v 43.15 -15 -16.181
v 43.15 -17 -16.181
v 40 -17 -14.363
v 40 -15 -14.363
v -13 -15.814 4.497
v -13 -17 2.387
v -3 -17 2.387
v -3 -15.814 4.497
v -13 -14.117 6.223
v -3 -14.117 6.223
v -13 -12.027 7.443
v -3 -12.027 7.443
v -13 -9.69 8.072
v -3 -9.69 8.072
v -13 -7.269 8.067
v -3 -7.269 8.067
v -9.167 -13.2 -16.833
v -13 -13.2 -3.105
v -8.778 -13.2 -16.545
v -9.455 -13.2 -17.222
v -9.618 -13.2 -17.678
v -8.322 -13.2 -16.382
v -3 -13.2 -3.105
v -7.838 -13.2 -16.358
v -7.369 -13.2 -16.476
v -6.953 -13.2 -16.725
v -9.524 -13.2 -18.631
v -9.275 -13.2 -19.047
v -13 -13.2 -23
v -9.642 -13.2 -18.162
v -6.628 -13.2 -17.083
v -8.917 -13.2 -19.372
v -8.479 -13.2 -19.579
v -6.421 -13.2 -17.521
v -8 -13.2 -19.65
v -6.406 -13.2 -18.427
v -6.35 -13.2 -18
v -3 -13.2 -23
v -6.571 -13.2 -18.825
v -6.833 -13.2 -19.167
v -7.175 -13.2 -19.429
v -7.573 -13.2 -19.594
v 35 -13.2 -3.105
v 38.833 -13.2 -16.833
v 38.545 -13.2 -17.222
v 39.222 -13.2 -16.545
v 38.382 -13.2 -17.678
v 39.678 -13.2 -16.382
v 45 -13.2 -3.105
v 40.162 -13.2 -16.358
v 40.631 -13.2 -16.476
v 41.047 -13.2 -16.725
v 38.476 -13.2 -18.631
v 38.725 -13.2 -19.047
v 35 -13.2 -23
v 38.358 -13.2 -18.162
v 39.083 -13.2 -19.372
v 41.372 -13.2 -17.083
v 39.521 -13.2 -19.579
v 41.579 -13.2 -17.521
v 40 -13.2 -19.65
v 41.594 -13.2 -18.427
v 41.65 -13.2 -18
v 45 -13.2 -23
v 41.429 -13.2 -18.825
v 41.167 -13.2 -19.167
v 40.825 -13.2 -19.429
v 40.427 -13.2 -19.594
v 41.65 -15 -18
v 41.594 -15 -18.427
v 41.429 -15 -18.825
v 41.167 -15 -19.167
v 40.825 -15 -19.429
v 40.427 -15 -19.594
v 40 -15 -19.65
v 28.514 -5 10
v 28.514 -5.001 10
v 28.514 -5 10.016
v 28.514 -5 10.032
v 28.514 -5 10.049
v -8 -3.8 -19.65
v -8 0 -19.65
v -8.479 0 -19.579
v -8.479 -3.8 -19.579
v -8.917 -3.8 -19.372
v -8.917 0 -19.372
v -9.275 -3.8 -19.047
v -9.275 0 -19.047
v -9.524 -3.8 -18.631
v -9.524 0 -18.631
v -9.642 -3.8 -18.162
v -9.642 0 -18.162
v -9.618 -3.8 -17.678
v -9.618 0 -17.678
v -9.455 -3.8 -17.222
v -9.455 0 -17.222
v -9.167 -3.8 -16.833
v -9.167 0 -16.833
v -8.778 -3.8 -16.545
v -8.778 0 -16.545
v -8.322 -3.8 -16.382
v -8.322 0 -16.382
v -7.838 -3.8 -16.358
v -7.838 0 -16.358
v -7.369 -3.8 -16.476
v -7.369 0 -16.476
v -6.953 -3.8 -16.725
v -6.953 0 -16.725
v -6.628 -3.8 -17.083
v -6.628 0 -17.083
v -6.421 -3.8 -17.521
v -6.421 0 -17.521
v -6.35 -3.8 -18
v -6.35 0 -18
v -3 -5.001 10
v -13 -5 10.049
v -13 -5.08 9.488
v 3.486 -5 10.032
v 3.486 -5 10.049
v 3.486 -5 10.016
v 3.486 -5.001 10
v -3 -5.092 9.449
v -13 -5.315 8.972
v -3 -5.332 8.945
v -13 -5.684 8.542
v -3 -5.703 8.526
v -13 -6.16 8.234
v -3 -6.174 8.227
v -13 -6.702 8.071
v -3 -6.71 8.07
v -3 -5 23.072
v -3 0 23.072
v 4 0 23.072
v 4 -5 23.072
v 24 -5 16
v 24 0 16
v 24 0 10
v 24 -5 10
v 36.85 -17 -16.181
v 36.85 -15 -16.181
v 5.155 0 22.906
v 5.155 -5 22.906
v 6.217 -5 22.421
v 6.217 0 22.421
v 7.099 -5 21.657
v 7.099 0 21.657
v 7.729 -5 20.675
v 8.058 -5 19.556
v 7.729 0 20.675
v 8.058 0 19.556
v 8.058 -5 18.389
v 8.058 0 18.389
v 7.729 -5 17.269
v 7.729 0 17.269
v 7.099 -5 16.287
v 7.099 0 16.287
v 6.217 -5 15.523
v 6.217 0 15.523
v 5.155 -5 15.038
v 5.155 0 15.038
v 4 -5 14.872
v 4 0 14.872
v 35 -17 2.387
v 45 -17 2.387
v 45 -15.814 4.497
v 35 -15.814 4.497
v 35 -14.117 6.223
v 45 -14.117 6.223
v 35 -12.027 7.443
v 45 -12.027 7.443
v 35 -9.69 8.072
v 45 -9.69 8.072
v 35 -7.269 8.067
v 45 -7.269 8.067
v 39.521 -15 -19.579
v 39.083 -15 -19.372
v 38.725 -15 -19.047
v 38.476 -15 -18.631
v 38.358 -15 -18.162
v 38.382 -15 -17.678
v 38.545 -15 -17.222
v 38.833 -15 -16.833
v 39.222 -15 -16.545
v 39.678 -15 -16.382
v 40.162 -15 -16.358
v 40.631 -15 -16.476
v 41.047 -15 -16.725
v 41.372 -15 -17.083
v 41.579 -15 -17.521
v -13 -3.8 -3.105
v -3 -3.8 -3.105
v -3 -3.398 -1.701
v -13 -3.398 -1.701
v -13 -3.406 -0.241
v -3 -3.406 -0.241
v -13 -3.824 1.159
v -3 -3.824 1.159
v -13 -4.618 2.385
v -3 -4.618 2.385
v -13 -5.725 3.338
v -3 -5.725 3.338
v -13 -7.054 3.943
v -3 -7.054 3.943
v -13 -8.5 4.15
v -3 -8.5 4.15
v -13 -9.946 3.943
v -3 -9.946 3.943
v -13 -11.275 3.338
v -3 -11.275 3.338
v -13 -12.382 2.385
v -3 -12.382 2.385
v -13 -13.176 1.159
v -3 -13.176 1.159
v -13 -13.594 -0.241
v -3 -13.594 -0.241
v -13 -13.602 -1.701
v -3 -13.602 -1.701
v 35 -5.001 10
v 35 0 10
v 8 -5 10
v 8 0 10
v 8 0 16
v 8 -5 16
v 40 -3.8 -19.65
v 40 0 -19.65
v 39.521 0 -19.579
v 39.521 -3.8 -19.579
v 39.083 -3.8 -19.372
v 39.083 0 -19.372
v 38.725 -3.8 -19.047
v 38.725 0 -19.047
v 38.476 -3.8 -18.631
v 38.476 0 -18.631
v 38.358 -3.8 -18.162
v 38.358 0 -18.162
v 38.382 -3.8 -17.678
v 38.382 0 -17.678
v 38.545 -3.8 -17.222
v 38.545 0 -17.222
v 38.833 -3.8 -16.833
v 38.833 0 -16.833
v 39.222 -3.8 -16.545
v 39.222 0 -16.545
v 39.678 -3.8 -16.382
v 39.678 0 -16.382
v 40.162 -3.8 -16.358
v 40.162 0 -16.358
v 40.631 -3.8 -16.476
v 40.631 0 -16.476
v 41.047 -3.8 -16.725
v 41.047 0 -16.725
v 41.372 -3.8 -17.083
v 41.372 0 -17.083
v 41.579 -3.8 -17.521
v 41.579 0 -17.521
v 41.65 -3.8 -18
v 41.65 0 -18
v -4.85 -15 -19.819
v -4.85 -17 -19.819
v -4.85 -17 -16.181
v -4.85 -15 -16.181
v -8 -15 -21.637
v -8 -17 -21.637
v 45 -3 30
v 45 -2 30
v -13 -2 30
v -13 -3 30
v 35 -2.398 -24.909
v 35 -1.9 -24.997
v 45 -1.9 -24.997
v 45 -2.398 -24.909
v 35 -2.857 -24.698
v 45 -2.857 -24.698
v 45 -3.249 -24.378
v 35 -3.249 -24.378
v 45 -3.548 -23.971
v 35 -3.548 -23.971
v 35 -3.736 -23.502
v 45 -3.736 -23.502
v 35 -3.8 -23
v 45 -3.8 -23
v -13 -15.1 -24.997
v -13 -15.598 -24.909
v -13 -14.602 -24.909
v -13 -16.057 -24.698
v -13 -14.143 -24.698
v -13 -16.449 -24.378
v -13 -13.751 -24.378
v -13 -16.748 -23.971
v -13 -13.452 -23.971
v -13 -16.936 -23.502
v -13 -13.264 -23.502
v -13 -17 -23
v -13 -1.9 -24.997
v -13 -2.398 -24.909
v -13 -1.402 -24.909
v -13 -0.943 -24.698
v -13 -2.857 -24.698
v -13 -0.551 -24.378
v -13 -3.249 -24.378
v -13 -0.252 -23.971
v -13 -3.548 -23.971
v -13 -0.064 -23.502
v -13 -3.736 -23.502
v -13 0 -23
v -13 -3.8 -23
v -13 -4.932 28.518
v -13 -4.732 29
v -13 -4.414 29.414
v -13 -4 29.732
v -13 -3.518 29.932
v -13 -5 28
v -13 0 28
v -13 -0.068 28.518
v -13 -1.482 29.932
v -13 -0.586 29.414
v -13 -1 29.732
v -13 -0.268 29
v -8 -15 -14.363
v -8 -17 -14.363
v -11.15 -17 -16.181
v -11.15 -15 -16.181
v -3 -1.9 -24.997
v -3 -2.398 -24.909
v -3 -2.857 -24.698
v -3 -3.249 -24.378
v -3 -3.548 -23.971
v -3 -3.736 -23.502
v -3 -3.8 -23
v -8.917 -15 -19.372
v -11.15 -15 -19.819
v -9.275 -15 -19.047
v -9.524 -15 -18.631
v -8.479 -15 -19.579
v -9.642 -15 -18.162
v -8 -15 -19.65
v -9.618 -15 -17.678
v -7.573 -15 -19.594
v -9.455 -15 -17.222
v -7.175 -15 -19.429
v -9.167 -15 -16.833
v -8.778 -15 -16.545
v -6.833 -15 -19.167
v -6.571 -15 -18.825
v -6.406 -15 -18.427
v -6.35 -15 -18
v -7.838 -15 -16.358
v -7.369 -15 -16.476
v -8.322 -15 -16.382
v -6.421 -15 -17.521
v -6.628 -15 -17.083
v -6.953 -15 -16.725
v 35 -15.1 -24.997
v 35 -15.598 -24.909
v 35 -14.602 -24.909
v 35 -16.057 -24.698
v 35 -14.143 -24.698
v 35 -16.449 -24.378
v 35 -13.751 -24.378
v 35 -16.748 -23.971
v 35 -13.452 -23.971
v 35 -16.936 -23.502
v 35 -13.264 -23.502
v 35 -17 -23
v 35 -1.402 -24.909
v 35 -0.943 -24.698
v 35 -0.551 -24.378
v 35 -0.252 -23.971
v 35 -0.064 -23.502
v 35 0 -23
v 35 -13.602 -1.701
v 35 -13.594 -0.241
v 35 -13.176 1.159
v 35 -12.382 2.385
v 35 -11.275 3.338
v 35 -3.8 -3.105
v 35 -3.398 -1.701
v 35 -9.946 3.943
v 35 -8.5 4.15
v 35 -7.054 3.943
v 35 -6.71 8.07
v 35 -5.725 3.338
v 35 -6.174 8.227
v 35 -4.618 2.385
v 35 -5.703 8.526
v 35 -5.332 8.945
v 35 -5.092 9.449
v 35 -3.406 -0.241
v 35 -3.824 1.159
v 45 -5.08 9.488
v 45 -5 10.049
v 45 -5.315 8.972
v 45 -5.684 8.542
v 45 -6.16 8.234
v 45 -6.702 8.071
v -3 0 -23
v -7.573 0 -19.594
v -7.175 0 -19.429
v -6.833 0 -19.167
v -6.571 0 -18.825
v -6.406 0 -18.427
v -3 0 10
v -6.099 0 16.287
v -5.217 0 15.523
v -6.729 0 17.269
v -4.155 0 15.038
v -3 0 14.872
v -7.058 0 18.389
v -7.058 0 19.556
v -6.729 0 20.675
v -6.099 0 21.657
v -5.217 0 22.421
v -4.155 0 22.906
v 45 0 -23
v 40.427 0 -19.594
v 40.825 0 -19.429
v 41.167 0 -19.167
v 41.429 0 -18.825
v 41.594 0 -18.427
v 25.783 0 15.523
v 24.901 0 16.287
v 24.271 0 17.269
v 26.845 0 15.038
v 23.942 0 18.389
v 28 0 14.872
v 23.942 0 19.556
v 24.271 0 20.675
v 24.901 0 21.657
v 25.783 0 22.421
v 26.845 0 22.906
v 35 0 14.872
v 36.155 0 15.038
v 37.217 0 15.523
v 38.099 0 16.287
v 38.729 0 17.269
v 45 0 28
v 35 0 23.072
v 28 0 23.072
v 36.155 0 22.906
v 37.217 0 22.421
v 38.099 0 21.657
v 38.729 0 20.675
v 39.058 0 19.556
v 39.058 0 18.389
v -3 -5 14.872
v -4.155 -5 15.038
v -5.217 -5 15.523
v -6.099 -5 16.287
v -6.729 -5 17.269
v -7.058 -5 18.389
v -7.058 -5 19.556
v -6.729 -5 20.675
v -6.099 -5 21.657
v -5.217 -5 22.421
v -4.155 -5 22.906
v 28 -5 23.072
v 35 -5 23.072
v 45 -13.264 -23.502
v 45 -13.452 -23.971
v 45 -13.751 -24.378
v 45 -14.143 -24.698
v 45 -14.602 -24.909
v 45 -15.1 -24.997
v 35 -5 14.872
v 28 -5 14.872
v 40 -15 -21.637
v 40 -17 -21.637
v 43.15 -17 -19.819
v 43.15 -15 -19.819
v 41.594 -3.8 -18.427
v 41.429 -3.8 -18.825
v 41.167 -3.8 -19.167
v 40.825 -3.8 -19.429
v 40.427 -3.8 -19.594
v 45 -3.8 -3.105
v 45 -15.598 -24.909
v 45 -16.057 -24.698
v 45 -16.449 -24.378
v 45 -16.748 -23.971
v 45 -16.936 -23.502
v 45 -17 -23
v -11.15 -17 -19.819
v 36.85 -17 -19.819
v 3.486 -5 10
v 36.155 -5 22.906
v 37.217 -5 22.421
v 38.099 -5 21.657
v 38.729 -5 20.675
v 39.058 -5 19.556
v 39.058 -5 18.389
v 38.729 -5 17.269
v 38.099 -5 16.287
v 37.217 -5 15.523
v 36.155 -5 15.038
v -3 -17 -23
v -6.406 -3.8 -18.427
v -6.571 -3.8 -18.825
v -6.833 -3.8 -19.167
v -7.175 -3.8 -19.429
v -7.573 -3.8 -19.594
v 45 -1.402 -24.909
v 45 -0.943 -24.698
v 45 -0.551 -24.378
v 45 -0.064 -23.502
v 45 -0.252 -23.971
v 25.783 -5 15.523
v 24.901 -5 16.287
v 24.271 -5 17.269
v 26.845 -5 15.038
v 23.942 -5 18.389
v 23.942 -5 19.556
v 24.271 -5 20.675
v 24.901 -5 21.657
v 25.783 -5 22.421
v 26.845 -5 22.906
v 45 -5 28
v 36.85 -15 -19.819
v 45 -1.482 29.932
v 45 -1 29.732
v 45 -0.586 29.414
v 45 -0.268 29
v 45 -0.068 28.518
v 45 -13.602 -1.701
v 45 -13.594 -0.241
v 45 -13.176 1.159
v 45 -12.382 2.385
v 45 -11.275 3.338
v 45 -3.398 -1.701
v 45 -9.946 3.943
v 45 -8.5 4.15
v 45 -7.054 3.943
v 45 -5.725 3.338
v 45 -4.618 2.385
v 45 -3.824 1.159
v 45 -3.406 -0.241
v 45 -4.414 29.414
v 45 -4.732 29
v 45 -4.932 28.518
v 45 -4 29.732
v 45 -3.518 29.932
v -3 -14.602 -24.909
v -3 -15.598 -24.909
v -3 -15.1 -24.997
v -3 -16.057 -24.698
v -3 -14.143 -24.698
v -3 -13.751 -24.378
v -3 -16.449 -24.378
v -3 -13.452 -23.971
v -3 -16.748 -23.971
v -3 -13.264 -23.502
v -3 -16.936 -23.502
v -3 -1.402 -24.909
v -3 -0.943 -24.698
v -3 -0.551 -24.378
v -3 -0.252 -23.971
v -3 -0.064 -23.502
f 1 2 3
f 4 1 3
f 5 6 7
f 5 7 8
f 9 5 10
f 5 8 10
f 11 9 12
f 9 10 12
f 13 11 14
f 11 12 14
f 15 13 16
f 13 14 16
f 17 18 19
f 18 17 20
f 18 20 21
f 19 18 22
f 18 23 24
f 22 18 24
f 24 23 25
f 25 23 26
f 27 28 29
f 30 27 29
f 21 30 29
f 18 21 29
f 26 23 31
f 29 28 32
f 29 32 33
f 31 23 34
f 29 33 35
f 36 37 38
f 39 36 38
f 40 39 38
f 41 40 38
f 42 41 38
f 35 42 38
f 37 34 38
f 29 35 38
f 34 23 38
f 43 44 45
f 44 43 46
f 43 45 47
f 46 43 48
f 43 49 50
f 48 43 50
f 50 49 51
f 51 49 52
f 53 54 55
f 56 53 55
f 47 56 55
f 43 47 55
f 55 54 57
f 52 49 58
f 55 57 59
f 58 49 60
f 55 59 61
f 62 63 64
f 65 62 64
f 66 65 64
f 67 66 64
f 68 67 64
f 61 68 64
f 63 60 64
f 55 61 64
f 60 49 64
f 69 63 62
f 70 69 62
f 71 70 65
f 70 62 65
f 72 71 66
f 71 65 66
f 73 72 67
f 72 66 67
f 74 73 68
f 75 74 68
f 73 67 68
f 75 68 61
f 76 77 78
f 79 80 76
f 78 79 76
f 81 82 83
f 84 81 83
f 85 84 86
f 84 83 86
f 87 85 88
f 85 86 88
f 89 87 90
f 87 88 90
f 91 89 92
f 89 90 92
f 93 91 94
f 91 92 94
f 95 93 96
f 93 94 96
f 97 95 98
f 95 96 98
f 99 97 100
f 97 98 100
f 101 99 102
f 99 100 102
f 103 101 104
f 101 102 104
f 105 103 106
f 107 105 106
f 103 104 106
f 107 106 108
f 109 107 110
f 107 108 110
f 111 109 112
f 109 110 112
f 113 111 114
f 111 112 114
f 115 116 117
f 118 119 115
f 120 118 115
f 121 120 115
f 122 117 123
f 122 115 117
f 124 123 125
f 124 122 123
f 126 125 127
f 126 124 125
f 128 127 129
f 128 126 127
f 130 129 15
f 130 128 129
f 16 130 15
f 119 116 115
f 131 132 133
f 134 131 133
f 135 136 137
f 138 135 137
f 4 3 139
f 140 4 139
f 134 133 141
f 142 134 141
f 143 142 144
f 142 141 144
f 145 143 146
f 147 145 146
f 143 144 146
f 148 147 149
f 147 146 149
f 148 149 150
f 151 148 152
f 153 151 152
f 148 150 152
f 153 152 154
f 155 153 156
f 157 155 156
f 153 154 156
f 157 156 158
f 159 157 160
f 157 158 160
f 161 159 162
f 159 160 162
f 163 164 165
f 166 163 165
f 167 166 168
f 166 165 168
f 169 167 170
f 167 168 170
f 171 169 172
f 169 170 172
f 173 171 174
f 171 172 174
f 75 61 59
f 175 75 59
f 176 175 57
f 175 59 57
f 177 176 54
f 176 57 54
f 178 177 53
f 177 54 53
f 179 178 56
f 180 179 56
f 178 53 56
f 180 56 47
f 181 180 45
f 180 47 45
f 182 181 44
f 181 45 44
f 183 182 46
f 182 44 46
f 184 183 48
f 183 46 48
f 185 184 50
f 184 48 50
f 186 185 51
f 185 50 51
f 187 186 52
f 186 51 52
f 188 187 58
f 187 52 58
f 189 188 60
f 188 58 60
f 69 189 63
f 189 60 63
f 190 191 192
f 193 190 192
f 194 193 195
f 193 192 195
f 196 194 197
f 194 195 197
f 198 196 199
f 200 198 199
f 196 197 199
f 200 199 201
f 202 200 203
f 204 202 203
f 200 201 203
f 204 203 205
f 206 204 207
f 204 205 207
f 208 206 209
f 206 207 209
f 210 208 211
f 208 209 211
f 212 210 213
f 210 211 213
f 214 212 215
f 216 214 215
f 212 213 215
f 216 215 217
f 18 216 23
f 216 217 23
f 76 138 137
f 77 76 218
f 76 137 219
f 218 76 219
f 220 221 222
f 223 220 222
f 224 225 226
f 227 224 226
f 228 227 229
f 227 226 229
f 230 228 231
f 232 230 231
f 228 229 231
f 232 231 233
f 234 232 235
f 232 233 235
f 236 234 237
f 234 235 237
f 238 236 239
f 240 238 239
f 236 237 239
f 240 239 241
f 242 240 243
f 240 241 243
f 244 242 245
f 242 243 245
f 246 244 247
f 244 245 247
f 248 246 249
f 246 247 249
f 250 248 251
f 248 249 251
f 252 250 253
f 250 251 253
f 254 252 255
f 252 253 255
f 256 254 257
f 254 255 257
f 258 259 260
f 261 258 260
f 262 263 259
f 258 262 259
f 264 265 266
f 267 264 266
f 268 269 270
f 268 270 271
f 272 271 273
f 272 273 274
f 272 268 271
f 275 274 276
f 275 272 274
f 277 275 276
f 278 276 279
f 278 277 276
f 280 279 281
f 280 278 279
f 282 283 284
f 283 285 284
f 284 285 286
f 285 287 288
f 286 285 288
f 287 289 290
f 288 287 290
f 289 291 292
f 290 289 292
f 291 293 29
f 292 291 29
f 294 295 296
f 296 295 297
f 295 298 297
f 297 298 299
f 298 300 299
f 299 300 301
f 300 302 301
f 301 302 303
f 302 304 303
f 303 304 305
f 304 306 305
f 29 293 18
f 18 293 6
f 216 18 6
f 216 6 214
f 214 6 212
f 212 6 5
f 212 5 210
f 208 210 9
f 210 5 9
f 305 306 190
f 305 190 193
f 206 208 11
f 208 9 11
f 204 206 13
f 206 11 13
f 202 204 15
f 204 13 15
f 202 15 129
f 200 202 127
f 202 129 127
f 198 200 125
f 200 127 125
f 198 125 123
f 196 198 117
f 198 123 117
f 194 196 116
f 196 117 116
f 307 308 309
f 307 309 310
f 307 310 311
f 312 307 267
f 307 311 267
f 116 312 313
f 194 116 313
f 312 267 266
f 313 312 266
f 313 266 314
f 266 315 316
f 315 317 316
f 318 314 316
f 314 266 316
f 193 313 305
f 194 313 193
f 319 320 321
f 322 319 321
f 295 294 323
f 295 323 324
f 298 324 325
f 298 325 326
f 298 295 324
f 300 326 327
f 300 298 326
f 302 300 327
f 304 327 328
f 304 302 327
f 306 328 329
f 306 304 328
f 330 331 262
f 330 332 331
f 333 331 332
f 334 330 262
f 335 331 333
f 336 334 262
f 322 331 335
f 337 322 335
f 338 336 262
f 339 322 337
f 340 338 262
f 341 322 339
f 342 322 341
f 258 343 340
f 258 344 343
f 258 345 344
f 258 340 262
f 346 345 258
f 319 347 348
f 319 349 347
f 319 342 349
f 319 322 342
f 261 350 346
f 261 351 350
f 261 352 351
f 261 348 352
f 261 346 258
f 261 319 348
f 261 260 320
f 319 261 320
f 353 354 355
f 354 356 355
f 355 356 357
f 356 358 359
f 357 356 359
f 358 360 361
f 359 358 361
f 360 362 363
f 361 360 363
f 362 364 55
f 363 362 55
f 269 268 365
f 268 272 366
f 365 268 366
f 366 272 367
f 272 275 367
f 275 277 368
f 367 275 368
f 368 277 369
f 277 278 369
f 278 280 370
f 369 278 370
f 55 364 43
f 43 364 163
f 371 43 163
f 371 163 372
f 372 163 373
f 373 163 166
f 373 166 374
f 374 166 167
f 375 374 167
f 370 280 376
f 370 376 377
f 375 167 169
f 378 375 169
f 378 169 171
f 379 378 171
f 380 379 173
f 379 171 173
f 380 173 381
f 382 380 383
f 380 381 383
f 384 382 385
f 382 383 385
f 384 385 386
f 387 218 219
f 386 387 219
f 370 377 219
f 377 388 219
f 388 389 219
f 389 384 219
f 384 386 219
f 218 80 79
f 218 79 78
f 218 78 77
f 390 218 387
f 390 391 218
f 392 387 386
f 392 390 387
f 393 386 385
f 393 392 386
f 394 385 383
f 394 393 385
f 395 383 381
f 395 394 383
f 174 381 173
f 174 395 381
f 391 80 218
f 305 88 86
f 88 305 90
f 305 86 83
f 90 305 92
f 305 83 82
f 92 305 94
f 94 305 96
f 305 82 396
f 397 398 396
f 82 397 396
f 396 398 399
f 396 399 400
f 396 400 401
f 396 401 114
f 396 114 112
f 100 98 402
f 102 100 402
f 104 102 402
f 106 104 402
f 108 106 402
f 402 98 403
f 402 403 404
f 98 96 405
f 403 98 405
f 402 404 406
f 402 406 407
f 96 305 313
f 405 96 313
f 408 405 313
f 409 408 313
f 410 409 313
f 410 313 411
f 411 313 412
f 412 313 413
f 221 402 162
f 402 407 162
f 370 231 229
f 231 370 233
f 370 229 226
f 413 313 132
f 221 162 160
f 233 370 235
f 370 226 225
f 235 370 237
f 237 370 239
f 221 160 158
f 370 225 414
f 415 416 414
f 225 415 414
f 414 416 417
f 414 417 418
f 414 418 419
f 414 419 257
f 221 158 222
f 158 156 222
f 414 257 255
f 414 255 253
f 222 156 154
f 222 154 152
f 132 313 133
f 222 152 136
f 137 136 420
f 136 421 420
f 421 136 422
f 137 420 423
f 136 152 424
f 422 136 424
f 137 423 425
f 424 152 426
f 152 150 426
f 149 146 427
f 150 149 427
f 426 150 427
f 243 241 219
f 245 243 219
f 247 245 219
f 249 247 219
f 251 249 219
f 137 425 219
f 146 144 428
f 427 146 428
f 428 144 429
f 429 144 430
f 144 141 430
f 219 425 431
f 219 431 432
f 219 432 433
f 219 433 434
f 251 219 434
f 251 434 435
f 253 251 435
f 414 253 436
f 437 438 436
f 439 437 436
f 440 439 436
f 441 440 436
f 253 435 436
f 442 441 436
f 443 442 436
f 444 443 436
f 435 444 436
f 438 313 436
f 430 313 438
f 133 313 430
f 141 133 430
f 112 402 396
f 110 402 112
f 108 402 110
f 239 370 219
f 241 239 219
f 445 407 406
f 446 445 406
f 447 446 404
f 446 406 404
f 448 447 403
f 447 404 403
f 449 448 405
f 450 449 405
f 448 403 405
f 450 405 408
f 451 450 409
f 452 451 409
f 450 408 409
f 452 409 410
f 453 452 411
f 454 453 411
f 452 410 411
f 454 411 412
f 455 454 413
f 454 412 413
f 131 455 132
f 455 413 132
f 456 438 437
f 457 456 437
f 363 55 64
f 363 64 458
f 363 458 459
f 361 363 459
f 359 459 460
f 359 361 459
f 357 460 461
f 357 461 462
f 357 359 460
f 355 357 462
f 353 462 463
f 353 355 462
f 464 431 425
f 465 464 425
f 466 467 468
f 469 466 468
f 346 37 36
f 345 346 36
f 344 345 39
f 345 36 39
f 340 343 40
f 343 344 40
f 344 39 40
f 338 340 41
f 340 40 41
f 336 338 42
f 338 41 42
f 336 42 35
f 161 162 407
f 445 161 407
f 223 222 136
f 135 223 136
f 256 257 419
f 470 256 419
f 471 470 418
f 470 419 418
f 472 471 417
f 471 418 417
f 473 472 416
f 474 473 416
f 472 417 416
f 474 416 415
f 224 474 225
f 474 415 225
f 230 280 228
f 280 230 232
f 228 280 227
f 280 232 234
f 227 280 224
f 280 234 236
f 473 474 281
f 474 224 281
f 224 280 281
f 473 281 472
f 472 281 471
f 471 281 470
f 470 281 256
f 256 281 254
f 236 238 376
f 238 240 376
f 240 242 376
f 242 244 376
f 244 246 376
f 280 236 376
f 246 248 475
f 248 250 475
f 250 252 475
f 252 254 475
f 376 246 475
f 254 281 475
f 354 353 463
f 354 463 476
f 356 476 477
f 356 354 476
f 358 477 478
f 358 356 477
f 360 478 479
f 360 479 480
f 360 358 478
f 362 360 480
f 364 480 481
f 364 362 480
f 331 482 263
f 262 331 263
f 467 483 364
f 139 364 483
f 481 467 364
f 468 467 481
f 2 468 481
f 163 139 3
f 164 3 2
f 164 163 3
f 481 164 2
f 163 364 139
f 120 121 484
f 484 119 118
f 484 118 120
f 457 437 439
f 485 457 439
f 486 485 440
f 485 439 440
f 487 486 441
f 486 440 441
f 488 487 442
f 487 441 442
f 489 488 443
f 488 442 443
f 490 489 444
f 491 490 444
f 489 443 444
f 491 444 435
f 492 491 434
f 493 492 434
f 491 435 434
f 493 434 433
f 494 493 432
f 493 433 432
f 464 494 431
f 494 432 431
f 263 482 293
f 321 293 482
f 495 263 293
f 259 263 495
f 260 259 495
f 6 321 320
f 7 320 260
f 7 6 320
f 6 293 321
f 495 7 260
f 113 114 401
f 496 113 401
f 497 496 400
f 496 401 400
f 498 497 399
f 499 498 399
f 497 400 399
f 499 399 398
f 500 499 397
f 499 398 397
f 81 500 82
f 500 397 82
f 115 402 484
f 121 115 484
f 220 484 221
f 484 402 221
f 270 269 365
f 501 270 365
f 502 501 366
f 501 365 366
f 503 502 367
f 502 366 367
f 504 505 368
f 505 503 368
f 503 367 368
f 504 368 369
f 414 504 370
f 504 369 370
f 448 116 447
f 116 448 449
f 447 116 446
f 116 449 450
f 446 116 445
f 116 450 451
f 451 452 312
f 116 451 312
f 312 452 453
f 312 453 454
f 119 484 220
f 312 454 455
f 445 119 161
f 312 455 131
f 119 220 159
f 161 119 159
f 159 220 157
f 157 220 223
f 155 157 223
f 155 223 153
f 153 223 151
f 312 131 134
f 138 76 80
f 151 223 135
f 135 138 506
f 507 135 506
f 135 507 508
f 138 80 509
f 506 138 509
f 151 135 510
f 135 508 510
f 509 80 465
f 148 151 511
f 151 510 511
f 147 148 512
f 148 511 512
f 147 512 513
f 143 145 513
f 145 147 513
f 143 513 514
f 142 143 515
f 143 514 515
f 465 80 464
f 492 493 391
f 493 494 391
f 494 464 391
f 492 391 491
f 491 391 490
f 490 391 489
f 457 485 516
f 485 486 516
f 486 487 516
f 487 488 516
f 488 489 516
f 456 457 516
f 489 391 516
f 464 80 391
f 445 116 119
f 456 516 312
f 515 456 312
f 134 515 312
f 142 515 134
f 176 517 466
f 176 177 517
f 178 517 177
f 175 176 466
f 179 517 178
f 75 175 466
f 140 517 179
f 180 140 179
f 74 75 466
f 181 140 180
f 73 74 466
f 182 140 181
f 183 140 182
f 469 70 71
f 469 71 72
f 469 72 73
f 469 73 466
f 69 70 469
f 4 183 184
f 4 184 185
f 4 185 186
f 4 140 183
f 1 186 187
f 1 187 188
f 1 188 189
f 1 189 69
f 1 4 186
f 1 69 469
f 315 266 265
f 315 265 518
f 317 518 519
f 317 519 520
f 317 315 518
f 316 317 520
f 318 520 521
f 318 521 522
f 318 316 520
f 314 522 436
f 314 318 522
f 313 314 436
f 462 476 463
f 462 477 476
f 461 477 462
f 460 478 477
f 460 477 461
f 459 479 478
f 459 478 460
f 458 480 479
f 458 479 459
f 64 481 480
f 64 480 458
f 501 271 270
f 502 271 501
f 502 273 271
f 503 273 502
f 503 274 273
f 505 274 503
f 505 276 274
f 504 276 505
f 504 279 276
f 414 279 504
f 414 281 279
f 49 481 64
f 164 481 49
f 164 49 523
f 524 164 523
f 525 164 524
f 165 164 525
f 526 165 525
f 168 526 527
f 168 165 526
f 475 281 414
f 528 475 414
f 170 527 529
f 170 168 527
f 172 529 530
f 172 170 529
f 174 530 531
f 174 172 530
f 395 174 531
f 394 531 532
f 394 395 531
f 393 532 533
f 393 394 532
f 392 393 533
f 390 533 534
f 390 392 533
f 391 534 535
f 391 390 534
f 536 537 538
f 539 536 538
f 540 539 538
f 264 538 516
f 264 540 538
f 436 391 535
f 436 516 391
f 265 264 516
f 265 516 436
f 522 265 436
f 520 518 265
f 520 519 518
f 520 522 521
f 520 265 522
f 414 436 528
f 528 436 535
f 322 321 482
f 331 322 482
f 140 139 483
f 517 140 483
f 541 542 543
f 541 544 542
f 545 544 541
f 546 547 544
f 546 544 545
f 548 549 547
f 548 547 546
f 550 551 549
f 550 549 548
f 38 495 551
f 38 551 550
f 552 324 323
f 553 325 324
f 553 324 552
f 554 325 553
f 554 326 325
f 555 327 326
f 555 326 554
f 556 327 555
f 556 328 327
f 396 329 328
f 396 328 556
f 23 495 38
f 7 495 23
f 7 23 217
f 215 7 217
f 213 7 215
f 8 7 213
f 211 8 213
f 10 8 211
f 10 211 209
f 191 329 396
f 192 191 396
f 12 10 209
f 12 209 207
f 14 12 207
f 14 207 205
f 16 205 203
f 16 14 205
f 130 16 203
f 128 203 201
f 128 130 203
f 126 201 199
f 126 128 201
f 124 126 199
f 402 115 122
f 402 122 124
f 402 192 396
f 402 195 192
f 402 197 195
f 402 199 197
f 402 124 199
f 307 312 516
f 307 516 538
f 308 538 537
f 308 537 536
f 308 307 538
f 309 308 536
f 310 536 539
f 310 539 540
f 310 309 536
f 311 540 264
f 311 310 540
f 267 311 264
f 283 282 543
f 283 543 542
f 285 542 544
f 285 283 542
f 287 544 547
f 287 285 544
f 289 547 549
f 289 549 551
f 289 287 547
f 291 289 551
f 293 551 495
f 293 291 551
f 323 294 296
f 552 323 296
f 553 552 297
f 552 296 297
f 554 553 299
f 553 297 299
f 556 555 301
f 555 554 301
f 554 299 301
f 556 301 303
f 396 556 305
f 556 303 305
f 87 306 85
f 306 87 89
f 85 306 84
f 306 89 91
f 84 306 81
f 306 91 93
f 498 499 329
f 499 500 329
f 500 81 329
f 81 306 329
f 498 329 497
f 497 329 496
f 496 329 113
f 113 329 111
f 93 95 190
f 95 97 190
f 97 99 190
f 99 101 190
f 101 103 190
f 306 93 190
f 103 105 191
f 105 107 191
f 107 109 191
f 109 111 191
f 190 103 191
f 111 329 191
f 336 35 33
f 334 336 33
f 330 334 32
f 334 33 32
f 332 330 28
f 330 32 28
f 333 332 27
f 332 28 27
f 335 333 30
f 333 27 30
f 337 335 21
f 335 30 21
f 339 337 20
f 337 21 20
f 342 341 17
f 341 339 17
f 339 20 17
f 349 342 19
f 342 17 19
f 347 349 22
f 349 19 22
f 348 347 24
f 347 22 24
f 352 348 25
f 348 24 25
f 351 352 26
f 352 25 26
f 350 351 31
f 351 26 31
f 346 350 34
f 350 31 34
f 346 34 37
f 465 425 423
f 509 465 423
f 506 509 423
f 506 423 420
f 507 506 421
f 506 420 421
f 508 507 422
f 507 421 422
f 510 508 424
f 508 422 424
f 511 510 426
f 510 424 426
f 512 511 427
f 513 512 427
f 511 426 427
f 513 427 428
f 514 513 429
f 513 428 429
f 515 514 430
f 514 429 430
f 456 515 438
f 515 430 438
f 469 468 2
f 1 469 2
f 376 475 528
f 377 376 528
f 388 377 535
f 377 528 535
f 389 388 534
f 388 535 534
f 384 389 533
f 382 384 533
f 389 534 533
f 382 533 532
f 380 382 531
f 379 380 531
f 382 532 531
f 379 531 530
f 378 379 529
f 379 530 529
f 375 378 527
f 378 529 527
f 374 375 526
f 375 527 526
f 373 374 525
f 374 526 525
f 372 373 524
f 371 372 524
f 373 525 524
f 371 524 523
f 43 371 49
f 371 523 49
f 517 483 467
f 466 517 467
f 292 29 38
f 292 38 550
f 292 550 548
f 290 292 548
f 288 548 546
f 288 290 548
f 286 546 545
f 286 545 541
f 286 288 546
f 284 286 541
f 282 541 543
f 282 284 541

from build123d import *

# Parameters (mm, degrees)
F1_DEPTH     = 17
F3_DEPTH     = 80
F4_T4_DEPTH  = 16.4862536334
F4_T10_DEPTH = 10
F4_T15_DEPTH = 10
F4_T20_DEPTH = 10
F4_T25_DEPTH = 10
F4_T30_DEPTH = 16.4862536334
F4_T33_DEPTH = 68
F4_T35_DEPTH = 20
F4_T37_DEPTH = 20
F5_R         = 1.65
F6_DEPTH     = 2


# Not quite as in the source:
# - a fillet or chamfer that OpenCascade refuses, or shapes differently, is made with other operations: its cross-section is extruded or revolved along the edge and cut away or added


with BuildPart() as f1:
    # F0 (on Front) → F1 (new body)
    with BuildSketch(Plane.XZ):
        Polygon((-13, 18.9721025527), (-13, -25), (-8, -25), (-3, -25), (-3, -5), (-3, 0), (-3, 5), (-3, 10), (8, 10), (8, 16), (24, 16), (24, 10), (35, 10), (35, 5), (35, 0), (35, -5), (35, -25), (40, -25), (45, -25), (45, 25), (45, 30), (-13, 30), (-13, 25), align=None)
        Polygon((-4.9, -19.7897858345), (-8, -21.579571669), (-11.1, -19.7897858345), (-11.1, -16.2102141655), (-8, -14.420428331), (-4.9, -16.2102141655), align=None, mode=Mode.SUBTRACT)
        Polygon((43.1, -19.7897858345), (40, -21.579571669), (36.9, -19.7897858345), (36.9, -16.2102141655), (40, -14.420428331), (43.1, -16.2102141655), align=None, mode=Mode.SUBTRACT)
        with BuildLine():
            ThreePointArc((-3, 14.8721025527), (-7.1, 18.9721025527), (-3, 23.0721025527))
            Line((-3, 23.0721025527), (4, 23.0721025527))
            ThreePointArc((4, 23.0721025527), (8.1, 18.9721025527), (4, 14.8721025527))
            Line((4, 14.8721025527), (-3, 14.8721025527))
        make_face(mode=Mode.SUBTRACT)
        with BuildLine():
            ThreePointArc((28, 14.8721025527), (23.9, 18.9721025527), (28, 23.0721025527))
            Line((28, 23.0721025527), (35, 23.0721025527))
            ThreePointArc((35, 23.0721025527), (39.1, 18.9721025527), (35, 14.8721025527))
            Line((35, 14.8721025527), (28, 14.8721025527))
        make_face(mode=Mode.SUBTRACT)
        Polygon((36.9, -19.7897858345), (40, -21.579571669), (43.1, -19.7897858345), (43.1, -16.2102141655), (40, -14.420428331), (36.9, -16.2102141655), align=None)
        with BuildLine():
            ThreePointArc((41.65, -18), (41.166726189, -19.166726189), (40, -19.65))
            ThreePointArc((40, -19.65), (38.833273811, -16.833273811), (41.65, -18))
        make_face(mode=Mode.SUBTRACT)
        Polygon((-11.1, -19.7897858345), (-8, -21.579571669), (-4.9, -19.7897858345), (-4.9, -16.2102141655), (-8, -14.420428331), (-11.1, -16.2102141655), align=None)
        with BuildLine():
            ThreePointArc((-6.35, -18), (-6.833273811, -19.166726189), (-8, -19.65))
            ThreePointArc((-8, -19.65), (-9.166726189, -16.833273811), (-6.35, -18))
        make_face(mode=Mode.SUBTRACT)
    extrude(amount=F1_DEPTH)

    # F2 (on face) → F3 (cut)
    with BuildSketch(Plane.YZ.offset(45)):
        with BuildLine():
            Line((-17, 30), (-17, 2.3871079109))
            ThreePointArc((-17, 2.3871079109), (-12.0593125845, 7.429341251), (-5, 7.4541409972))
            Line((-5, 7.4541409972), (-5, 30))
            Line((-5, 30), (-17, 30))
        make_face()
        with BuildLine():
            Line((-3.8, -25), (-3.8, -3.1053503271))
            ThreePointArc((-3.8, -3.1053503271), (-8.5, 4.15), (-13.2, -3.1053503271))
            Line((-13.2, -3.1053503271), (-13.2, -25))
            Line((-13.2, -25), (-4, -25))
            Line((-4, -25), (-3.8, -25))
        make_face()
    extrude(amount=-F3_DEPTH, mode=Mode.SUBTRACT)

    # F4: fillet of radius 2 on 12 edges, made by hand


with BuildPart() as f4_tool2:
    # F4_s3 → F4_t4 (new body)
    with BuildSketch(Plane.YZ.offset(3.4862536334)):
        with BuildLine():
            ThreePointArc((-5, 10.0486424505), (-5.6843474227, 8.5423030811), (-7.269058296, 8.0668231769))
            ThreePointArc((-7.269058296, 8.0668231769), (-6.1147752276, 7.8336404039), (-5, 7.4541409972))
            Line((-5, 7.4541409972), (-5, 10.0486424505))
        make_face()
    extrude(amount=-F4_T4_DEPTH)

    split(bisect_by=Plane.YZ.offset(-3), keep=Keep.TOP)

    split(bisect_by=Plane.XY.offset(10), keep=Keep.TOP)


with BuildPart() as f1_1:
    add(f1.part)

    # F4_t1: union F4_tool2
    add(f4_tool2.part)


with BuildPart() as f4_tool8:
    # F4_s9 → F4_t10 (new body)
    with BuildSketch(Plane.YZ.offset(-3)):
        with BuildLine():
            ThreePointArc((-5, 10.0486424505), (-5.6843474227, 8.5423030811), (-7.269058296, 8.0668231769))
            ThreePointArc((-7.269058296, 8.0668231769), (-6.1147752276, 7.8336404039), (-5, 7.4541409972))
            Line((-5, 7.4541409972), (-5, 10.0486424505))
        make_face()
    extrude(amount=-F4_T10_DEPTH)

    split(bisect_by=Plane.XY.offset(10), keep=Keep.TOP)


with BuildPart() as f1_2:
    add(f1_1.part)

    # F4_t7: union F4_tool8
    add(f4_tool8.part)


with BuildPart() as f4_tool13:
    # F4_s14 → F4_t15 (new body)
    with BuildSketch(Plane.YZ.offset(-3)):
        with BuildLine():
            ThreePointArc((-5, 10.0486424505), (-5.6843474227, 8.5423030811), (-7.269058296, 8.0668231769))
            ThreePointArc((-7.269058296, 8.0668231769), (-6.1147752276, 7.8336404039), (-5, 7.4541409972))
            Line((-5, 7.4541409972), (-5, 10.0486424505))
        make_face()
    extrude(amount=-F4_T15_DEPTH)

    split(bisect_by=Plane.XY.offset(10), keep=Keep.BOTTOM)


with BuildPart() as f1_3:
    add(f1_2.part)

    # F4_t12: union F4_tool13
    add(f4_tool13.part)


with BuildPart() as f4_tool18:
    # F4_s19 → F4_t20 (new body)
    with BuildSketch(Plane.YZ.offset(45)):
        with BuildLine():
            ThreePointArc((-5, 10.0486424505), (-5.6843474227, 8.5423030811), (-7.269058296, 8.0668231769))
            ThreePointArc((-7.269058296, 8.0668231769), (-6.1147752276, 7.8336404039), (-5, 7.4541409972))
            Line((-5, 7.4541409972), (-5, 10.0486424505))
        make_face()
    extrude(amount=-F4_T20_DEPTH)

    split(bisect_by=Plane.XY.offset(10), keep=Keep.TOP)


with BuildPart() as f1_4:
    add(f1_3.part)

    # F4_t17: union F4_tool18
    add(f4_tool18.part)


with BuildPart() as f4_tool23:
    # F4_s24 → F4_t25 (new body)
    with BuildSketch(Plane.YZ.offset(45)):
        with BuildLine():
            ThreePointArc((-5, 10.0486424505), (-5.6843474227, 8.5423030811), (-7.269058296, 8.0668231769))
            ThreePointArc((-7.269058296, 8.0668231769), (-6.1147752276, 7.8336404039), (-5, 7.4541409972))
            Line((-5, 7.4541409972), (-5, 10.0486424505))
        make_face()
    extrude(amount=-F4_T25_DEPTH)

    split(bisect_by=Plane.XY.offset(10), keep=Keep.BOTTOM)


with BuildPart() as f1_5:
    add(f1_4.part)

    # F4_t22: union F4_tool23
    add(f4_tool23.part)


with BuildPart() as f4_tool28:
    # F4_s29 → F4_t30 (new body)
    with BuildSketch(Plane.YZ.offset(45)):
        with BuildLine():
            ThreePointArc((-5, 10.0486424505), (-5.6843474227, 8.5423030811), (-7.269058296, 8.0668231769))
            ThreePointArc((-7.269058296, 8.0668231769), (-6.1147752276, 7.8336404039), (-5, 7.4541409972))
            Line((-5, 7.4541409972), (-5, 10.0486424505))
        make_face()
    extrude(amount=-F4_T30_DEPTH)

    split(bisect_by=Plane.XY.offset(10), keep=Keep.TOP)

    split(bisect_by=Plane.YZ.offset(35), keep=Keep.BOTTOM)


with BuildPart() as f1_6:
    add(f1_5.part)

    # F4_t27: union F4_tool28
    add(f4_tool28.part)

    # F4_s34 → F4_t33 (cut)
    with BuildSketch(Plane.YZ.offset(-18)):
        with BuildLine():
            ThreePointArc((-5, 28), (-4.4142135624, 29.4142135624), (-3, 30))
            Line((-3, 30), (-5, 30))
            Line((-5, 30), (-5, 28))
        make_face()
        with BuildLine():
            ThreePointArc((-2, 30), (-0.5857864376, 29.4142135624), (0, 28))
            Line((0, 28), (0, 30))
            Line((0, 30), (-2, 30))
        make_face()
    extrude(amount=F4_T33_DEPTH, mode=Mode.SUBTRACT)

    # F4_s36 → F4_t35 (cut)
    with BuildSketch(Plane.YZ.offset(30)):
        with BuildLine():
            ThreePointArc((-15, -25), (-16.4142135624, -24.4142135624), (-17, -23))
            Line((-17, -23), (-17, -25))
            Line((-17, -25), (-15, -25))
        make_face()
        with BuildLine():
            ThreePointArc((-13.2, -23), (-13.7857864376, -24.4142135624), (-15.2, -25))
            Line((-15.2, -25), (-13.2, -25))
            Line((-13.2, -25), (-13.2, -23))
        make_face()
        with BuildLine():
            ThreePointArc((-1.8, -25), (-3.2142135624, -24.4142135624), (-3.8, -23))
            Line((-3.8, -23), (-3.8, -25))
            Line((-3.8, -25), (-1.8, -25))
        make_face()
        with BuildLine():
            ThreePointArc((-2, -25), (-0.5857864376, -24.4142135624), (0, -23))
            Line((0, -23), (0, -25))
            Line((0, -25), (-2, -25))
        make_face()
    extrude(amount=F4_T35_DEPTH, mode=Mode.SUBTRACT)

    # F4_s38 → F4_t37 (cut)
    with BuildSketch(Plane.YZ.offset(-18)):
        with BuildLine():
            ThreePointArc((-15, -25), (-16.4142135624, -24.4142135624), (-17, -23))
            Line((-17, -23), (-17, -25))
            Line((-17, -25), (-15, -25))
        make_face()
        with BuildLine():
            ThreePointArc((-13.2, -23), (-13.7857864376, -24.4142135624), (-15.2, -25))
            Line((-15.2, -25), (-13.2, -25))
            Line((-13.2, -25), (-13.2, -23))
        make_face()
        with BuildLine():
            ThreePointArc((-1.8, -25), (-3.2142135624, -24.4142135624), (-3.8, -23))
            Line((-3.8, -23), (-3.8, -25))
            Line((-3.8, -25), (-1.8, -25))
        make_face()
        with BuildLine():
            ThreePointArc((-2, -25), (-0.5857864376, -24.4142135624), (0, -23))
            Line((0, -23), (0, -25))
            Line((0, -25), (-2, -25))
        make_face()
    extrude(amount=F4_T37_DEPTH, mode=Mode.SUBTRACT)

    # F5 (on face) → F6 (cut)
    with BuildSketch(Plane.XZ.offset(17)):
        Polygon((-4.85, -19.8186533479), (-4.85, -16.1813466521), (-8, -14.3626933041), (-11.15, -16.1813466521), (-11.15, -19.8186533479), (-8, -21.6373066959), align=None)
        with Locations((-8, -18)):
            Circle(F5_R, mode=Mode.SUBTRACT)
        Polygon((36.85, -16.1813466521), (36.85, -19.8186533479), (40, -21.6373066959), (43.15, -19.8186533479), (43.15, -16.1813466521), (40, -14.3626933041), align=None)
    extrude(amount=-F6_DEPTH, mode=Mode.SUBTRACT)


solid = f1_6.part
